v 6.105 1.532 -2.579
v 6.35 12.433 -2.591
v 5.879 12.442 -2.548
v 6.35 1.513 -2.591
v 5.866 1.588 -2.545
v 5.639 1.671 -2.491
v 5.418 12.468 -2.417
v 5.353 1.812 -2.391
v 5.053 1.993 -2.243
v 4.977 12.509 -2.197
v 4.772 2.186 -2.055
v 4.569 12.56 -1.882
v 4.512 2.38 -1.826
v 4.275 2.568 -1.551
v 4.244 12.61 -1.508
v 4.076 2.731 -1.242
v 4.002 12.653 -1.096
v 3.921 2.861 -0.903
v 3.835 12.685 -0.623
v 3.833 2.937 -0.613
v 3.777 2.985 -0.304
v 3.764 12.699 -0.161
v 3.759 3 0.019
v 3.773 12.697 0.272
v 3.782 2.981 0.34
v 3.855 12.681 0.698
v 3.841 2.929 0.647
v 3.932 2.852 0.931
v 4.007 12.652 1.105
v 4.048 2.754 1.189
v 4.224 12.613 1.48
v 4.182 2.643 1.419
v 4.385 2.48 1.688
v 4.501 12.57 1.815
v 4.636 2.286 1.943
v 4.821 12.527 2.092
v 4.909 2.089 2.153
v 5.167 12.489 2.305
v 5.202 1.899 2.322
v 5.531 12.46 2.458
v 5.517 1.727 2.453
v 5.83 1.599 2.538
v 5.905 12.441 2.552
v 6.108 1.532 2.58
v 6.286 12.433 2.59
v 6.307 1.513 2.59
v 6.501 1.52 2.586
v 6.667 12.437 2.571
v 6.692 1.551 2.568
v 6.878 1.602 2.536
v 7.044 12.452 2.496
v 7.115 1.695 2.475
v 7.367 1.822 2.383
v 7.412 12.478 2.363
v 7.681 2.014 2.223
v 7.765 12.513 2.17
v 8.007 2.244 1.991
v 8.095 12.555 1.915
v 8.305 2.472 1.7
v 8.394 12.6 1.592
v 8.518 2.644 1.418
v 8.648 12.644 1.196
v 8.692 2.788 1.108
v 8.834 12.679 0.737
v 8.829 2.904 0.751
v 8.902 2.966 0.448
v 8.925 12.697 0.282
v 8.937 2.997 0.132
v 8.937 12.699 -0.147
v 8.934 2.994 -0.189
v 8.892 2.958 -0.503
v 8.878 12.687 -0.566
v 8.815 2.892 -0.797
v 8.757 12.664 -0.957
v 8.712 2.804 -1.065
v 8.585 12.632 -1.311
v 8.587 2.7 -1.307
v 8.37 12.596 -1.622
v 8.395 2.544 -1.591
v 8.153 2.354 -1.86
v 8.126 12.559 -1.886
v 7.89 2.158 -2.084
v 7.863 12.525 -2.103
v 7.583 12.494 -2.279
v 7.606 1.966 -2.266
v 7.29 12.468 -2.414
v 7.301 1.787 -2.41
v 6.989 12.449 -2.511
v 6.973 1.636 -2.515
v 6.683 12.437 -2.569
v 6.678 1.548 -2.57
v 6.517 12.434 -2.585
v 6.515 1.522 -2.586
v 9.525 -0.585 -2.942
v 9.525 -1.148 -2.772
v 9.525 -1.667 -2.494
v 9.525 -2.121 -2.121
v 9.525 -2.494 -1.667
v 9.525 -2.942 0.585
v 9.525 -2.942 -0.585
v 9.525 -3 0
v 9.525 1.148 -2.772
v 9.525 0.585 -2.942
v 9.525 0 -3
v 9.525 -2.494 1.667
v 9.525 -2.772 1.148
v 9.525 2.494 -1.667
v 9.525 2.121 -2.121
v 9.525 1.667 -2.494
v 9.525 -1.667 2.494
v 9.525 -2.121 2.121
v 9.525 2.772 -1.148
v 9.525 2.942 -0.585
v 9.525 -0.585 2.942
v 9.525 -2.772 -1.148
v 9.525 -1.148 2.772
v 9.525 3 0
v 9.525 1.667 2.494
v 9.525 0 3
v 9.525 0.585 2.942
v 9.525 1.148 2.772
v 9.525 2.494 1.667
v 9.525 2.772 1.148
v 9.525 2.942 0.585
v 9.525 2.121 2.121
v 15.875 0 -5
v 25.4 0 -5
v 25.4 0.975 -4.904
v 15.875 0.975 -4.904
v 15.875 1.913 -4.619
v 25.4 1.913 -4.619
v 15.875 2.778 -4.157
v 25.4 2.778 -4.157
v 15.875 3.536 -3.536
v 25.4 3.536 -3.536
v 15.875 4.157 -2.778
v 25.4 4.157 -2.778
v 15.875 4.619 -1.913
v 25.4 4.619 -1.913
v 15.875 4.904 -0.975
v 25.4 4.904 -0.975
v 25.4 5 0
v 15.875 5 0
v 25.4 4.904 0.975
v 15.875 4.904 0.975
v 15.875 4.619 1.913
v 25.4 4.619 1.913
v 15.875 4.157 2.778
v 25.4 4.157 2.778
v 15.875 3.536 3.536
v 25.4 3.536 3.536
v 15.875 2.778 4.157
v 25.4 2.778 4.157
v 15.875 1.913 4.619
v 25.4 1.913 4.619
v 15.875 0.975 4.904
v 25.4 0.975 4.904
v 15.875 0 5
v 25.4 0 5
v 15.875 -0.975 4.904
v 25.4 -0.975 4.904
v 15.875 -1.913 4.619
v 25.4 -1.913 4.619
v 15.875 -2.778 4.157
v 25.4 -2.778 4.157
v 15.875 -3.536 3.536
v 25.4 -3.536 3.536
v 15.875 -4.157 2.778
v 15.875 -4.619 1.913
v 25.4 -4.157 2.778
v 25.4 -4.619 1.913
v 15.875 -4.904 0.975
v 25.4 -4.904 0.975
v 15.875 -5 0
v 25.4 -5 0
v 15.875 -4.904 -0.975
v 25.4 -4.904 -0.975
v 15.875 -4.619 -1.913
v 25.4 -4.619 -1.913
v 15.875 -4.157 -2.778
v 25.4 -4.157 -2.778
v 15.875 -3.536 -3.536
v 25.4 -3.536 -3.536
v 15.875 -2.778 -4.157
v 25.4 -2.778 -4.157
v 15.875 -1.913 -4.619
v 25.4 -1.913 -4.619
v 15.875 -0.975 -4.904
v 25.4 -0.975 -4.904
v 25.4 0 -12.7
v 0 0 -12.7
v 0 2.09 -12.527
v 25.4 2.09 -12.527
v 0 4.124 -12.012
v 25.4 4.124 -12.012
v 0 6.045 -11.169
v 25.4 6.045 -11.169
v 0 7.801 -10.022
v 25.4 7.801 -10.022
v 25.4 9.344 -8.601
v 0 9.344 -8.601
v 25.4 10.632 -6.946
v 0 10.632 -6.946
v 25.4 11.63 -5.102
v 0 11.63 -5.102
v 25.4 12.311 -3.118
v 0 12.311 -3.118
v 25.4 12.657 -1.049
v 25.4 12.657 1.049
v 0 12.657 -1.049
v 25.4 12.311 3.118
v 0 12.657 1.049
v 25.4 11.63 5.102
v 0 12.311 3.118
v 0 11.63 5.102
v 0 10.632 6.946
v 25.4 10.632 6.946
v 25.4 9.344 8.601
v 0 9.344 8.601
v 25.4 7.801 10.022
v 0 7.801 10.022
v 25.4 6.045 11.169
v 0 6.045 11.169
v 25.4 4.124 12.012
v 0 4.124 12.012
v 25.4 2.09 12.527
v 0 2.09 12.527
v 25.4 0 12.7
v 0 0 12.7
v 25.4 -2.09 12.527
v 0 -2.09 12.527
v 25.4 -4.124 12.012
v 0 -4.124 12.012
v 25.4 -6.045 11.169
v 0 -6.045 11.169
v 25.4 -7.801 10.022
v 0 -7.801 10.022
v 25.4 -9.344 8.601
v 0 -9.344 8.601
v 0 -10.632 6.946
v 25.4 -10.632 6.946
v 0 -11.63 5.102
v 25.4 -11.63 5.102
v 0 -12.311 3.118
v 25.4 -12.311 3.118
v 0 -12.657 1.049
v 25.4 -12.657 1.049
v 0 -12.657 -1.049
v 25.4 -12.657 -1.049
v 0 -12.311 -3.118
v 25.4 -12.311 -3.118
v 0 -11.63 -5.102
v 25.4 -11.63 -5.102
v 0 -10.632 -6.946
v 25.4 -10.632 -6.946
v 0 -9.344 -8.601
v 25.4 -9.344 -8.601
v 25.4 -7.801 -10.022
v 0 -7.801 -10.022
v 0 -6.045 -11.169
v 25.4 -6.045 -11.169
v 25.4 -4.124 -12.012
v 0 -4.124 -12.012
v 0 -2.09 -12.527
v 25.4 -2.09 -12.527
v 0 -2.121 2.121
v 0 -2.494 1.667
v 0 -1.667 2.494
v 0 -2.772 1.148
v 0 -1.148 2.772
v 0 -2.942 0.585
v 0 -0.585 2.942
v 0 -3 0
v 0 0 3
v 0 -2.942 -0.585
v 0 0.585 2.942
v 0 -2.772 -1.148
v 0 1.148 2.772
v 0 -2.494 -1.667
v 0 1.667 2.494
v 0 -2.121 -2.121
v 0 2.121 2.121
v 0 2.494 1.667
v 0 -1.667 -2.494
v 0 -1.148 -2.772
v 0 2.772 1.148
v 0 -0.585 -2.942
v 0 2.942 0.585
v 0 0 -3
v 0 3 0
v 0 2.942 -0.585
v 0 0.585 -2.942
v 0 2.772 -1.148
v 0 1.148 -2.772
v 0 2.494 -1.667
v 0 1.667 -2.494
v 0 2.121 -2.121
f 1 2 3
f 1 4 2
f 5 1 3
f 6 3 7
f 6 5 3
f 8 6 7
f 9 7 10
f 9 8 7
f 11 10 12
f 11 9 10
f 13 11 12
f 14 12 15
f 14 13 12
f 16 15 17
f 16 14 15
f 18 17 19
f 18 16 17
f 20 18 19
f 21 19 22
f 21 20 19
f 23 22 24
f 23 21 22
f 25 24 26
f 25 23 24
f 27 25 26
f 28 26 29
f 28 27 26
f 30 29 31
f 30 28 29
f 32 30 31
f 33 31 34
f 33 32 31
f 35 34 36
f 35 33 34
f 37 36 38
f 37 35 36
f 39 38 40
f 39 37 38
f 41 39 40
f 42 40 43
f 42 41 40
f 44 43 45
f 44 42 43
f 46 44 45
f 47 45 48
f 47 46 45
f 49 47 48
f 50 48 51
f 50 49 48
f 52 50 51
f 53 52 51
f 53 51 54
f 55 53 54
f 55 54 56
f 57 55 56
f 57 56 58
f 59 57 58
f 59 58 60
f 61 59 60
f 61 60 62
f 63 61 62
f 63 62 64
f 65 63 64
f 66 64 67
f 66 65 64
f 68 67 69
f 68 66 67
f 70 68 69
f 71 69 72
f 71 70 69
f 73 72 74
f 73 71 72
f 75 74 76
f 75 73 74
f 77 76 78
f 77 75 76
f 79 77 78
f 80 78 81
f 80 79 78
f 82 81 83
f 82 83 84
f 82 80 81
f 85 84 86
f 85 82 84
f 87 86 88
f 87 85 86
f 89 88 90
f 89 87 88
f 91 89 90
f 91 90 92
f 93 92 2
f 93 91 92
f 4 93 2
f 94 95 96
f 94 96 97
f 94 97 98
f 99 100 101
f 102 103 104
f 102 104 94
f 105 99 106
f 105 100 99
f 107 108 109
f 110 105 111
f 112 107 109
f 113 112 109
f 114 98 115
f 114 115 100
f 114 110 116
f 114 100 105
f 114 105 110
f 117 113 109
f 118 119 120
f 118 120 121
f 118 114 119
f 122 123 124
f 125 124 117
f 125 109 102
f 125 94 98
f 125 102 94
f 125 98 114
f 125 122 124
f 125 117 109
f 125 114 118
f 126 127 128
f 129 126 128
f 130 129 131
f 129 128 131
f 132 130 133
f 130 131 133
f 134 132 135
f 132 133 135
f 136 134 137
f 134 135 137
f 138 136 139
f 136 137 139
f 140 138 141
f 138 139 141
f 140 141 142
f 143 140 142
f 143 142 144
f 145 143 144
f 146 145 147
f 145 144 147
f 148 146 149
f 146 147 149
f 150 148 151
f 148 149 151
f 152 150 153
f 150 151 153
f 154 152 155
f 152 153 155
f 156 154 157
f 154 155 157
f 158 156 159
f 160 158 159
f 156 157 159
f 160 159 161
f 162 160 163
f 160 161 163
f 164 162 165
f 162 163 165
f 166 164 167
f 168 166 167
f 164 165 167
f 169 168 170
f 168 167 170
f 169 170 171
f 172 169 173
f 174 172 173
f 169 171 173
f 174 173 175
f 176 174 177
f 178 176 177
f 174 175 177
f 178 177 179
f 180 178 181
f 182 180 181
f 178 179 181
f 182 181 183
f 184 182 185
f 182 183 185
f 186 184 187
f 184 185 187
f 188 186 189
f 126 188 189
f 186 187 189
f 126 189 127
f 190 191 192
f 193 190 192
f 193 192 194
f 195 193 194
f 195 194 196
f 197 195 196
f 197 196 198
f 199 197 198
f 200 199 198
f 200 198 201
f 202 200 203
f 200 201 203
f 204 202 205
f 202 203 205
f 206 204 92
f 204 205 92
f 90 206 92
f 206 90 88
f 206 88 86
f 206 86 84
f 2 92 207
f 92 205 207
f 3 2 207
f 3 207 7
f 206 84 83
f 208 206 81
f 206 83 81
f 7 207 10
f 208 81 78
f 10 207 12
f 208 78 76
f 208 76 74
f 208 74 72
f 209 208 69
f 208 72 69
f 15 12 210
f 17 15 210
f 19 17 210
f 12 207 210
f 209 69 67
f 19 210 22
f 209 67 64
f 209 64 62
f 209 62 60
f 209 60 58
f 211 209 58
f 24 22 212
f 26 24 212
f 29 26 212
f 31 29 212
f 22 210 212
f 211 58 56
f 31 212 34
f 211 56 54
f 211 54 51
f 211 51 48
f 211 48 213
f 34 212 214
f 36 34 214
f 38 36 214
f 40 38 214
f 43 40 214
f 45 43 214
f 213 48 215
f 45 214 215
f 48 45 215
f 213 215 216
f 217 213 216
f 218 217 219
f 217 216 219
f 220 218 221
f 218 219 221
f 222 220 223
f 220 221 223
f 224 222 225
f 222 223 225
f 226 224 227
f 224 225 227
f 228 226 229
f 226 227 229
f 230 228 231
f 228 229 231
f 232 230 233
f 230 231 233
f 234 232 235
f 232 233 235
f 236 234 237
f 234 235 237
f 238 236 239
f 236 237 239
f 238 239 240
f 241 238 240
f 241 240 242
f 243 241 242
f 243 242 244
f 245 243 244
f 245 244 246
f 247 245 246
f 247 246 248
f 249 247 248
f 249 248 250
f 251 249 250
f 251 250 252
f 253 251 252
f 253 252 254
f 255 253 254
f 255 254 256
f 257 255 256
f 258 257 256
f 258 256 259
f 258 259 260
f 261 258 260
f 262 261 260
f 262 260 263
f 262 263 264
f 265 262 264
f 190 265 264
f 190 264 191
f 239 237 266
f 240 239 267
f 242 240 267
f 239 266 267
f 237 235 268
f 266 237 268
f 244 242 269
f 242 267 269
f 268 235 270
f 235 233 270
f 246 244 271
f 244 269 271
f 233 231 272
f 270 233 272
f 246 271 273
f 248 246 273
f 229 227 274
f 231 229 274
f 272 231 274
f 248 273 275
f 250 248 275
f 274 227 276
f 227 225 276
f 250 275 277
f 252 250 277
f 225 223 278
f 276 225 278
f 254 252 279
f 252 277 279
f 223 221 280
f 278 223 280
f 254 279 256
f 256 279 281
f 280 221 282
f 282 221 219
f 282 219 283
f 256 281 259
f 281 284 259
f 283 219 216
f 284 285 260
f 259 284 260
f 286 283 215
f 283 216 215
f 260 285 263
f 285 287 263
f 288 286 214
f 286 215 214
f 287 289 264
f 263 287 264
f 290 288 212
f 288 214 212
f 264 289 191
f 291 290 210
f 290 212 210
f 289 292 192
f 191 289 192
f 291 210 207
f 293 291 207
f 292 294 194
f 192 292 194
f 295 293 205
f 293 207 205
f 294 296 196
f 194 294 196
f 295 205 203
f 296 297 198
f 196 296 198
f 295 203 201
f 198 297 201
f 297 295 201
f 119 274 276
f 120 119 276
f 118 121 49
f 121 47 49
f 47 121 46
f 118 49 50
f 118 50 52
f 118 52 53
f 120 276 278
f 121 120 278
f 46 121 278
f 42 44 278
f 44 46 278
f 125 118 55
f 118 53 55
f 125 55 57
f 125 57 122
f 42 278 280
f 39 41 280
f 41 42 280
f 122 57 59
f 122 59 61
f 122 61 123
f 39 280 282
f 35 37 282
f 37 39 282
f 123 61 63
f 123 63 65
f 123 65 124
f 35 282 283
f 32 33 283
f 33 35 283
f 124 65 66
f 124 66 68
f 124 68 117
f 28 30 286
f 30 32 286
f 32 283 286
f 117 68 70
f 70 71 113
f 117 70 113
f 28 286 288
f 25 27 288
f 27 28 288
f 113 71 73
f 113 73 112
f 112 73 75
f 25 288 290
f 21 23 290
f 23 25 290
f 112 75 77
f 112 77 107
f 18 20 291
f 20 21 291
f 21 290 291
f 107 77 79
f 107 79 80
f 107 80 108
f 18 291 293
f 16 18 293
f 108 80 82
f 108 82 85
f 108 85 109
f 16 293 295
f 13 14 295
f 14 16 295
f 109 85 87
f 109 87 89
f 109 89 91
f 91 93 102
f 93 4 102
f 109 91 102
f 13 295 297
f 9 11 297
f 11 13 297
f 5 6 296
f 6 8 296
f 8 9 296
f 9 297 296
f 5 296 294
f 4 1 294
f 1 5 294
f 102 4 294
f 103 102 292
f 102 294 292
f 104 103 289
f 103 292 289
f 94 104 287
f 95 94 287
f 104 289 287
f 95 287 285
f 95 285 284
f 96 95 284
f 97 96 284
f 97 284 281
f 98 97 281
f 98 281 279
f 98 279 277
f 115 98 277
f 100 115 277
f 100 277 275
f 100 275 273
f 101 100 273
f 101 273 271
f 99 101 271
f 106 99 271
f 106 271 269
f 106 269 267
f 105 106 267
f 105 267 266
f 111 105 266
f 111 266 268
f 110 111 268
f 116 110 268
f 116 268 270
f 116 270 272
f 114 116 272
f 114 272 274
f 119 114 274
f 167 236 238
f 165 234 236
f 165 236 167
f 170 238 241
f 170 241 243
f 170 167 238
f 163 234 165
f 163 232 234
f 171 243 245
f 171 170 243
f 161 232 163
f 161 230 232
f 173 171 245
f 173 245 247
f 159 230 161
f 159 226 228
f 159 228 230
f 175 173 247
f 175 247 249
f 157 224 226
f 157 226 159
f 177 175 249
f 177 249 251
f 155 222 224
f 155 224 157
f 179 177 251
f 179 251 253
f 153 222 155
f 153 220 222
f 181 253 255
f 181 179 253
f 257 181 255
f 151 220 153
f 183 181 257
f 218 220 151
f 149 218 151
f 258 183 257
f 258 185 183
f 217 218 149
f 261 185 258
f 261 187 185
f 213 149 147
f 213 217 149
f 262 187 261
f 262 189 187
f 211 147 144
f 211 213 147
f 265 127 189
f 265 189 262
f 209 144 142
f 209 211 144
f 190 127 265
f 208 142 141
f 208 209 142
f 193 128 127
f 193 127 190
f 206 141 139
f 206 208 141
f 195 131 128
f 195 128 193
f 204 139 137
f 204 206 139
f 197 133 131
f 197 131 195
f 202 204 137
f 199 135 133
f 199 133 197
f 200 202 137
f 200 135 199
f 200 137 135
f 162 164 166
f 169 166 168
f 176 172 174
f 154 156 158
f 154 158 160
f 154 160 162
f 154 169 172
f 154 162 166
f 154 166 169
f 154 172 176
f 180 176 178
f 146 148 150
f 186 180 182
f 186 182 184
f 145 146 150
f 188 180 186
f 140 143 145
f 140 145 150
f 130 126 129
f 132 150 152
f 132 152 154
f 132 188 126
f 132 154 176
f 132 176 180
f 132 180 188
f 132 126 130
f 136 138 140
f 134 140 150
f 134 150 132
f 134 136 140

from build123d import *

# Parameters (mm, degrees)
SKETCH1_R           = 12.7
BOSS_EXTRUDE1_DEPTH = 25.4
SKETCH2_R           = 3
CUT_EXTRUDE1_DEPTH  = 9.525
SKETCH3_R           = 5
CUT_EXTRUDE2_DEPTH  = 9.525


with BuildPart() as part:
    # Sketch1 → Boss-Extrude1 (new body)
    with BuildSketch(Plane(origin=(0, 0, 0), x_dir=(0, 0, -1), z_dir=(1, 0, 0))):
        Circle(SKETCH1_R)
    extrude(amount=BOSS_EXTRUDE1_DEPTH)

    # Sketch2 → Cut-Extrude1 (cut)
    with BuildSketch(Plane.ZY):
        Circle(SKETCH2_R)
    extrude(amount=-CUT_EXTRUDE1_DEPTH, mode=Mode.SUBTRACT)

    # Sketch7 → #6 (0.204) Diameter Hole1 (revolve, cut)
    with BuildSketch(Plane(origin=(6.35, 0, 0), x_dir=(0, 0, -1), z_dir=(1, 0, 0))):
        Polygon((0, 0), (0, 16.288709692), (2.5908, 14.732), (2.5908, 0), align=None)
    revolve(axis=Axis((6.35, -6.35, 0), (0, 1, 0)), mode=Mode.SUBTRACT)

    # Sketch3 → Cut-Extrude2 (cut)
    with BuildSketch(Plane(origin=(25.4, 0, 0), x_dir=(0, 0, -1), z_dir=(1, 0, 0))):
        Circle(SKETCH3_R)
    extrude(amount=-CUT_EXTRUDE2_DEPTH, mode=Mode.SUBTRACT)


solid = part.part
